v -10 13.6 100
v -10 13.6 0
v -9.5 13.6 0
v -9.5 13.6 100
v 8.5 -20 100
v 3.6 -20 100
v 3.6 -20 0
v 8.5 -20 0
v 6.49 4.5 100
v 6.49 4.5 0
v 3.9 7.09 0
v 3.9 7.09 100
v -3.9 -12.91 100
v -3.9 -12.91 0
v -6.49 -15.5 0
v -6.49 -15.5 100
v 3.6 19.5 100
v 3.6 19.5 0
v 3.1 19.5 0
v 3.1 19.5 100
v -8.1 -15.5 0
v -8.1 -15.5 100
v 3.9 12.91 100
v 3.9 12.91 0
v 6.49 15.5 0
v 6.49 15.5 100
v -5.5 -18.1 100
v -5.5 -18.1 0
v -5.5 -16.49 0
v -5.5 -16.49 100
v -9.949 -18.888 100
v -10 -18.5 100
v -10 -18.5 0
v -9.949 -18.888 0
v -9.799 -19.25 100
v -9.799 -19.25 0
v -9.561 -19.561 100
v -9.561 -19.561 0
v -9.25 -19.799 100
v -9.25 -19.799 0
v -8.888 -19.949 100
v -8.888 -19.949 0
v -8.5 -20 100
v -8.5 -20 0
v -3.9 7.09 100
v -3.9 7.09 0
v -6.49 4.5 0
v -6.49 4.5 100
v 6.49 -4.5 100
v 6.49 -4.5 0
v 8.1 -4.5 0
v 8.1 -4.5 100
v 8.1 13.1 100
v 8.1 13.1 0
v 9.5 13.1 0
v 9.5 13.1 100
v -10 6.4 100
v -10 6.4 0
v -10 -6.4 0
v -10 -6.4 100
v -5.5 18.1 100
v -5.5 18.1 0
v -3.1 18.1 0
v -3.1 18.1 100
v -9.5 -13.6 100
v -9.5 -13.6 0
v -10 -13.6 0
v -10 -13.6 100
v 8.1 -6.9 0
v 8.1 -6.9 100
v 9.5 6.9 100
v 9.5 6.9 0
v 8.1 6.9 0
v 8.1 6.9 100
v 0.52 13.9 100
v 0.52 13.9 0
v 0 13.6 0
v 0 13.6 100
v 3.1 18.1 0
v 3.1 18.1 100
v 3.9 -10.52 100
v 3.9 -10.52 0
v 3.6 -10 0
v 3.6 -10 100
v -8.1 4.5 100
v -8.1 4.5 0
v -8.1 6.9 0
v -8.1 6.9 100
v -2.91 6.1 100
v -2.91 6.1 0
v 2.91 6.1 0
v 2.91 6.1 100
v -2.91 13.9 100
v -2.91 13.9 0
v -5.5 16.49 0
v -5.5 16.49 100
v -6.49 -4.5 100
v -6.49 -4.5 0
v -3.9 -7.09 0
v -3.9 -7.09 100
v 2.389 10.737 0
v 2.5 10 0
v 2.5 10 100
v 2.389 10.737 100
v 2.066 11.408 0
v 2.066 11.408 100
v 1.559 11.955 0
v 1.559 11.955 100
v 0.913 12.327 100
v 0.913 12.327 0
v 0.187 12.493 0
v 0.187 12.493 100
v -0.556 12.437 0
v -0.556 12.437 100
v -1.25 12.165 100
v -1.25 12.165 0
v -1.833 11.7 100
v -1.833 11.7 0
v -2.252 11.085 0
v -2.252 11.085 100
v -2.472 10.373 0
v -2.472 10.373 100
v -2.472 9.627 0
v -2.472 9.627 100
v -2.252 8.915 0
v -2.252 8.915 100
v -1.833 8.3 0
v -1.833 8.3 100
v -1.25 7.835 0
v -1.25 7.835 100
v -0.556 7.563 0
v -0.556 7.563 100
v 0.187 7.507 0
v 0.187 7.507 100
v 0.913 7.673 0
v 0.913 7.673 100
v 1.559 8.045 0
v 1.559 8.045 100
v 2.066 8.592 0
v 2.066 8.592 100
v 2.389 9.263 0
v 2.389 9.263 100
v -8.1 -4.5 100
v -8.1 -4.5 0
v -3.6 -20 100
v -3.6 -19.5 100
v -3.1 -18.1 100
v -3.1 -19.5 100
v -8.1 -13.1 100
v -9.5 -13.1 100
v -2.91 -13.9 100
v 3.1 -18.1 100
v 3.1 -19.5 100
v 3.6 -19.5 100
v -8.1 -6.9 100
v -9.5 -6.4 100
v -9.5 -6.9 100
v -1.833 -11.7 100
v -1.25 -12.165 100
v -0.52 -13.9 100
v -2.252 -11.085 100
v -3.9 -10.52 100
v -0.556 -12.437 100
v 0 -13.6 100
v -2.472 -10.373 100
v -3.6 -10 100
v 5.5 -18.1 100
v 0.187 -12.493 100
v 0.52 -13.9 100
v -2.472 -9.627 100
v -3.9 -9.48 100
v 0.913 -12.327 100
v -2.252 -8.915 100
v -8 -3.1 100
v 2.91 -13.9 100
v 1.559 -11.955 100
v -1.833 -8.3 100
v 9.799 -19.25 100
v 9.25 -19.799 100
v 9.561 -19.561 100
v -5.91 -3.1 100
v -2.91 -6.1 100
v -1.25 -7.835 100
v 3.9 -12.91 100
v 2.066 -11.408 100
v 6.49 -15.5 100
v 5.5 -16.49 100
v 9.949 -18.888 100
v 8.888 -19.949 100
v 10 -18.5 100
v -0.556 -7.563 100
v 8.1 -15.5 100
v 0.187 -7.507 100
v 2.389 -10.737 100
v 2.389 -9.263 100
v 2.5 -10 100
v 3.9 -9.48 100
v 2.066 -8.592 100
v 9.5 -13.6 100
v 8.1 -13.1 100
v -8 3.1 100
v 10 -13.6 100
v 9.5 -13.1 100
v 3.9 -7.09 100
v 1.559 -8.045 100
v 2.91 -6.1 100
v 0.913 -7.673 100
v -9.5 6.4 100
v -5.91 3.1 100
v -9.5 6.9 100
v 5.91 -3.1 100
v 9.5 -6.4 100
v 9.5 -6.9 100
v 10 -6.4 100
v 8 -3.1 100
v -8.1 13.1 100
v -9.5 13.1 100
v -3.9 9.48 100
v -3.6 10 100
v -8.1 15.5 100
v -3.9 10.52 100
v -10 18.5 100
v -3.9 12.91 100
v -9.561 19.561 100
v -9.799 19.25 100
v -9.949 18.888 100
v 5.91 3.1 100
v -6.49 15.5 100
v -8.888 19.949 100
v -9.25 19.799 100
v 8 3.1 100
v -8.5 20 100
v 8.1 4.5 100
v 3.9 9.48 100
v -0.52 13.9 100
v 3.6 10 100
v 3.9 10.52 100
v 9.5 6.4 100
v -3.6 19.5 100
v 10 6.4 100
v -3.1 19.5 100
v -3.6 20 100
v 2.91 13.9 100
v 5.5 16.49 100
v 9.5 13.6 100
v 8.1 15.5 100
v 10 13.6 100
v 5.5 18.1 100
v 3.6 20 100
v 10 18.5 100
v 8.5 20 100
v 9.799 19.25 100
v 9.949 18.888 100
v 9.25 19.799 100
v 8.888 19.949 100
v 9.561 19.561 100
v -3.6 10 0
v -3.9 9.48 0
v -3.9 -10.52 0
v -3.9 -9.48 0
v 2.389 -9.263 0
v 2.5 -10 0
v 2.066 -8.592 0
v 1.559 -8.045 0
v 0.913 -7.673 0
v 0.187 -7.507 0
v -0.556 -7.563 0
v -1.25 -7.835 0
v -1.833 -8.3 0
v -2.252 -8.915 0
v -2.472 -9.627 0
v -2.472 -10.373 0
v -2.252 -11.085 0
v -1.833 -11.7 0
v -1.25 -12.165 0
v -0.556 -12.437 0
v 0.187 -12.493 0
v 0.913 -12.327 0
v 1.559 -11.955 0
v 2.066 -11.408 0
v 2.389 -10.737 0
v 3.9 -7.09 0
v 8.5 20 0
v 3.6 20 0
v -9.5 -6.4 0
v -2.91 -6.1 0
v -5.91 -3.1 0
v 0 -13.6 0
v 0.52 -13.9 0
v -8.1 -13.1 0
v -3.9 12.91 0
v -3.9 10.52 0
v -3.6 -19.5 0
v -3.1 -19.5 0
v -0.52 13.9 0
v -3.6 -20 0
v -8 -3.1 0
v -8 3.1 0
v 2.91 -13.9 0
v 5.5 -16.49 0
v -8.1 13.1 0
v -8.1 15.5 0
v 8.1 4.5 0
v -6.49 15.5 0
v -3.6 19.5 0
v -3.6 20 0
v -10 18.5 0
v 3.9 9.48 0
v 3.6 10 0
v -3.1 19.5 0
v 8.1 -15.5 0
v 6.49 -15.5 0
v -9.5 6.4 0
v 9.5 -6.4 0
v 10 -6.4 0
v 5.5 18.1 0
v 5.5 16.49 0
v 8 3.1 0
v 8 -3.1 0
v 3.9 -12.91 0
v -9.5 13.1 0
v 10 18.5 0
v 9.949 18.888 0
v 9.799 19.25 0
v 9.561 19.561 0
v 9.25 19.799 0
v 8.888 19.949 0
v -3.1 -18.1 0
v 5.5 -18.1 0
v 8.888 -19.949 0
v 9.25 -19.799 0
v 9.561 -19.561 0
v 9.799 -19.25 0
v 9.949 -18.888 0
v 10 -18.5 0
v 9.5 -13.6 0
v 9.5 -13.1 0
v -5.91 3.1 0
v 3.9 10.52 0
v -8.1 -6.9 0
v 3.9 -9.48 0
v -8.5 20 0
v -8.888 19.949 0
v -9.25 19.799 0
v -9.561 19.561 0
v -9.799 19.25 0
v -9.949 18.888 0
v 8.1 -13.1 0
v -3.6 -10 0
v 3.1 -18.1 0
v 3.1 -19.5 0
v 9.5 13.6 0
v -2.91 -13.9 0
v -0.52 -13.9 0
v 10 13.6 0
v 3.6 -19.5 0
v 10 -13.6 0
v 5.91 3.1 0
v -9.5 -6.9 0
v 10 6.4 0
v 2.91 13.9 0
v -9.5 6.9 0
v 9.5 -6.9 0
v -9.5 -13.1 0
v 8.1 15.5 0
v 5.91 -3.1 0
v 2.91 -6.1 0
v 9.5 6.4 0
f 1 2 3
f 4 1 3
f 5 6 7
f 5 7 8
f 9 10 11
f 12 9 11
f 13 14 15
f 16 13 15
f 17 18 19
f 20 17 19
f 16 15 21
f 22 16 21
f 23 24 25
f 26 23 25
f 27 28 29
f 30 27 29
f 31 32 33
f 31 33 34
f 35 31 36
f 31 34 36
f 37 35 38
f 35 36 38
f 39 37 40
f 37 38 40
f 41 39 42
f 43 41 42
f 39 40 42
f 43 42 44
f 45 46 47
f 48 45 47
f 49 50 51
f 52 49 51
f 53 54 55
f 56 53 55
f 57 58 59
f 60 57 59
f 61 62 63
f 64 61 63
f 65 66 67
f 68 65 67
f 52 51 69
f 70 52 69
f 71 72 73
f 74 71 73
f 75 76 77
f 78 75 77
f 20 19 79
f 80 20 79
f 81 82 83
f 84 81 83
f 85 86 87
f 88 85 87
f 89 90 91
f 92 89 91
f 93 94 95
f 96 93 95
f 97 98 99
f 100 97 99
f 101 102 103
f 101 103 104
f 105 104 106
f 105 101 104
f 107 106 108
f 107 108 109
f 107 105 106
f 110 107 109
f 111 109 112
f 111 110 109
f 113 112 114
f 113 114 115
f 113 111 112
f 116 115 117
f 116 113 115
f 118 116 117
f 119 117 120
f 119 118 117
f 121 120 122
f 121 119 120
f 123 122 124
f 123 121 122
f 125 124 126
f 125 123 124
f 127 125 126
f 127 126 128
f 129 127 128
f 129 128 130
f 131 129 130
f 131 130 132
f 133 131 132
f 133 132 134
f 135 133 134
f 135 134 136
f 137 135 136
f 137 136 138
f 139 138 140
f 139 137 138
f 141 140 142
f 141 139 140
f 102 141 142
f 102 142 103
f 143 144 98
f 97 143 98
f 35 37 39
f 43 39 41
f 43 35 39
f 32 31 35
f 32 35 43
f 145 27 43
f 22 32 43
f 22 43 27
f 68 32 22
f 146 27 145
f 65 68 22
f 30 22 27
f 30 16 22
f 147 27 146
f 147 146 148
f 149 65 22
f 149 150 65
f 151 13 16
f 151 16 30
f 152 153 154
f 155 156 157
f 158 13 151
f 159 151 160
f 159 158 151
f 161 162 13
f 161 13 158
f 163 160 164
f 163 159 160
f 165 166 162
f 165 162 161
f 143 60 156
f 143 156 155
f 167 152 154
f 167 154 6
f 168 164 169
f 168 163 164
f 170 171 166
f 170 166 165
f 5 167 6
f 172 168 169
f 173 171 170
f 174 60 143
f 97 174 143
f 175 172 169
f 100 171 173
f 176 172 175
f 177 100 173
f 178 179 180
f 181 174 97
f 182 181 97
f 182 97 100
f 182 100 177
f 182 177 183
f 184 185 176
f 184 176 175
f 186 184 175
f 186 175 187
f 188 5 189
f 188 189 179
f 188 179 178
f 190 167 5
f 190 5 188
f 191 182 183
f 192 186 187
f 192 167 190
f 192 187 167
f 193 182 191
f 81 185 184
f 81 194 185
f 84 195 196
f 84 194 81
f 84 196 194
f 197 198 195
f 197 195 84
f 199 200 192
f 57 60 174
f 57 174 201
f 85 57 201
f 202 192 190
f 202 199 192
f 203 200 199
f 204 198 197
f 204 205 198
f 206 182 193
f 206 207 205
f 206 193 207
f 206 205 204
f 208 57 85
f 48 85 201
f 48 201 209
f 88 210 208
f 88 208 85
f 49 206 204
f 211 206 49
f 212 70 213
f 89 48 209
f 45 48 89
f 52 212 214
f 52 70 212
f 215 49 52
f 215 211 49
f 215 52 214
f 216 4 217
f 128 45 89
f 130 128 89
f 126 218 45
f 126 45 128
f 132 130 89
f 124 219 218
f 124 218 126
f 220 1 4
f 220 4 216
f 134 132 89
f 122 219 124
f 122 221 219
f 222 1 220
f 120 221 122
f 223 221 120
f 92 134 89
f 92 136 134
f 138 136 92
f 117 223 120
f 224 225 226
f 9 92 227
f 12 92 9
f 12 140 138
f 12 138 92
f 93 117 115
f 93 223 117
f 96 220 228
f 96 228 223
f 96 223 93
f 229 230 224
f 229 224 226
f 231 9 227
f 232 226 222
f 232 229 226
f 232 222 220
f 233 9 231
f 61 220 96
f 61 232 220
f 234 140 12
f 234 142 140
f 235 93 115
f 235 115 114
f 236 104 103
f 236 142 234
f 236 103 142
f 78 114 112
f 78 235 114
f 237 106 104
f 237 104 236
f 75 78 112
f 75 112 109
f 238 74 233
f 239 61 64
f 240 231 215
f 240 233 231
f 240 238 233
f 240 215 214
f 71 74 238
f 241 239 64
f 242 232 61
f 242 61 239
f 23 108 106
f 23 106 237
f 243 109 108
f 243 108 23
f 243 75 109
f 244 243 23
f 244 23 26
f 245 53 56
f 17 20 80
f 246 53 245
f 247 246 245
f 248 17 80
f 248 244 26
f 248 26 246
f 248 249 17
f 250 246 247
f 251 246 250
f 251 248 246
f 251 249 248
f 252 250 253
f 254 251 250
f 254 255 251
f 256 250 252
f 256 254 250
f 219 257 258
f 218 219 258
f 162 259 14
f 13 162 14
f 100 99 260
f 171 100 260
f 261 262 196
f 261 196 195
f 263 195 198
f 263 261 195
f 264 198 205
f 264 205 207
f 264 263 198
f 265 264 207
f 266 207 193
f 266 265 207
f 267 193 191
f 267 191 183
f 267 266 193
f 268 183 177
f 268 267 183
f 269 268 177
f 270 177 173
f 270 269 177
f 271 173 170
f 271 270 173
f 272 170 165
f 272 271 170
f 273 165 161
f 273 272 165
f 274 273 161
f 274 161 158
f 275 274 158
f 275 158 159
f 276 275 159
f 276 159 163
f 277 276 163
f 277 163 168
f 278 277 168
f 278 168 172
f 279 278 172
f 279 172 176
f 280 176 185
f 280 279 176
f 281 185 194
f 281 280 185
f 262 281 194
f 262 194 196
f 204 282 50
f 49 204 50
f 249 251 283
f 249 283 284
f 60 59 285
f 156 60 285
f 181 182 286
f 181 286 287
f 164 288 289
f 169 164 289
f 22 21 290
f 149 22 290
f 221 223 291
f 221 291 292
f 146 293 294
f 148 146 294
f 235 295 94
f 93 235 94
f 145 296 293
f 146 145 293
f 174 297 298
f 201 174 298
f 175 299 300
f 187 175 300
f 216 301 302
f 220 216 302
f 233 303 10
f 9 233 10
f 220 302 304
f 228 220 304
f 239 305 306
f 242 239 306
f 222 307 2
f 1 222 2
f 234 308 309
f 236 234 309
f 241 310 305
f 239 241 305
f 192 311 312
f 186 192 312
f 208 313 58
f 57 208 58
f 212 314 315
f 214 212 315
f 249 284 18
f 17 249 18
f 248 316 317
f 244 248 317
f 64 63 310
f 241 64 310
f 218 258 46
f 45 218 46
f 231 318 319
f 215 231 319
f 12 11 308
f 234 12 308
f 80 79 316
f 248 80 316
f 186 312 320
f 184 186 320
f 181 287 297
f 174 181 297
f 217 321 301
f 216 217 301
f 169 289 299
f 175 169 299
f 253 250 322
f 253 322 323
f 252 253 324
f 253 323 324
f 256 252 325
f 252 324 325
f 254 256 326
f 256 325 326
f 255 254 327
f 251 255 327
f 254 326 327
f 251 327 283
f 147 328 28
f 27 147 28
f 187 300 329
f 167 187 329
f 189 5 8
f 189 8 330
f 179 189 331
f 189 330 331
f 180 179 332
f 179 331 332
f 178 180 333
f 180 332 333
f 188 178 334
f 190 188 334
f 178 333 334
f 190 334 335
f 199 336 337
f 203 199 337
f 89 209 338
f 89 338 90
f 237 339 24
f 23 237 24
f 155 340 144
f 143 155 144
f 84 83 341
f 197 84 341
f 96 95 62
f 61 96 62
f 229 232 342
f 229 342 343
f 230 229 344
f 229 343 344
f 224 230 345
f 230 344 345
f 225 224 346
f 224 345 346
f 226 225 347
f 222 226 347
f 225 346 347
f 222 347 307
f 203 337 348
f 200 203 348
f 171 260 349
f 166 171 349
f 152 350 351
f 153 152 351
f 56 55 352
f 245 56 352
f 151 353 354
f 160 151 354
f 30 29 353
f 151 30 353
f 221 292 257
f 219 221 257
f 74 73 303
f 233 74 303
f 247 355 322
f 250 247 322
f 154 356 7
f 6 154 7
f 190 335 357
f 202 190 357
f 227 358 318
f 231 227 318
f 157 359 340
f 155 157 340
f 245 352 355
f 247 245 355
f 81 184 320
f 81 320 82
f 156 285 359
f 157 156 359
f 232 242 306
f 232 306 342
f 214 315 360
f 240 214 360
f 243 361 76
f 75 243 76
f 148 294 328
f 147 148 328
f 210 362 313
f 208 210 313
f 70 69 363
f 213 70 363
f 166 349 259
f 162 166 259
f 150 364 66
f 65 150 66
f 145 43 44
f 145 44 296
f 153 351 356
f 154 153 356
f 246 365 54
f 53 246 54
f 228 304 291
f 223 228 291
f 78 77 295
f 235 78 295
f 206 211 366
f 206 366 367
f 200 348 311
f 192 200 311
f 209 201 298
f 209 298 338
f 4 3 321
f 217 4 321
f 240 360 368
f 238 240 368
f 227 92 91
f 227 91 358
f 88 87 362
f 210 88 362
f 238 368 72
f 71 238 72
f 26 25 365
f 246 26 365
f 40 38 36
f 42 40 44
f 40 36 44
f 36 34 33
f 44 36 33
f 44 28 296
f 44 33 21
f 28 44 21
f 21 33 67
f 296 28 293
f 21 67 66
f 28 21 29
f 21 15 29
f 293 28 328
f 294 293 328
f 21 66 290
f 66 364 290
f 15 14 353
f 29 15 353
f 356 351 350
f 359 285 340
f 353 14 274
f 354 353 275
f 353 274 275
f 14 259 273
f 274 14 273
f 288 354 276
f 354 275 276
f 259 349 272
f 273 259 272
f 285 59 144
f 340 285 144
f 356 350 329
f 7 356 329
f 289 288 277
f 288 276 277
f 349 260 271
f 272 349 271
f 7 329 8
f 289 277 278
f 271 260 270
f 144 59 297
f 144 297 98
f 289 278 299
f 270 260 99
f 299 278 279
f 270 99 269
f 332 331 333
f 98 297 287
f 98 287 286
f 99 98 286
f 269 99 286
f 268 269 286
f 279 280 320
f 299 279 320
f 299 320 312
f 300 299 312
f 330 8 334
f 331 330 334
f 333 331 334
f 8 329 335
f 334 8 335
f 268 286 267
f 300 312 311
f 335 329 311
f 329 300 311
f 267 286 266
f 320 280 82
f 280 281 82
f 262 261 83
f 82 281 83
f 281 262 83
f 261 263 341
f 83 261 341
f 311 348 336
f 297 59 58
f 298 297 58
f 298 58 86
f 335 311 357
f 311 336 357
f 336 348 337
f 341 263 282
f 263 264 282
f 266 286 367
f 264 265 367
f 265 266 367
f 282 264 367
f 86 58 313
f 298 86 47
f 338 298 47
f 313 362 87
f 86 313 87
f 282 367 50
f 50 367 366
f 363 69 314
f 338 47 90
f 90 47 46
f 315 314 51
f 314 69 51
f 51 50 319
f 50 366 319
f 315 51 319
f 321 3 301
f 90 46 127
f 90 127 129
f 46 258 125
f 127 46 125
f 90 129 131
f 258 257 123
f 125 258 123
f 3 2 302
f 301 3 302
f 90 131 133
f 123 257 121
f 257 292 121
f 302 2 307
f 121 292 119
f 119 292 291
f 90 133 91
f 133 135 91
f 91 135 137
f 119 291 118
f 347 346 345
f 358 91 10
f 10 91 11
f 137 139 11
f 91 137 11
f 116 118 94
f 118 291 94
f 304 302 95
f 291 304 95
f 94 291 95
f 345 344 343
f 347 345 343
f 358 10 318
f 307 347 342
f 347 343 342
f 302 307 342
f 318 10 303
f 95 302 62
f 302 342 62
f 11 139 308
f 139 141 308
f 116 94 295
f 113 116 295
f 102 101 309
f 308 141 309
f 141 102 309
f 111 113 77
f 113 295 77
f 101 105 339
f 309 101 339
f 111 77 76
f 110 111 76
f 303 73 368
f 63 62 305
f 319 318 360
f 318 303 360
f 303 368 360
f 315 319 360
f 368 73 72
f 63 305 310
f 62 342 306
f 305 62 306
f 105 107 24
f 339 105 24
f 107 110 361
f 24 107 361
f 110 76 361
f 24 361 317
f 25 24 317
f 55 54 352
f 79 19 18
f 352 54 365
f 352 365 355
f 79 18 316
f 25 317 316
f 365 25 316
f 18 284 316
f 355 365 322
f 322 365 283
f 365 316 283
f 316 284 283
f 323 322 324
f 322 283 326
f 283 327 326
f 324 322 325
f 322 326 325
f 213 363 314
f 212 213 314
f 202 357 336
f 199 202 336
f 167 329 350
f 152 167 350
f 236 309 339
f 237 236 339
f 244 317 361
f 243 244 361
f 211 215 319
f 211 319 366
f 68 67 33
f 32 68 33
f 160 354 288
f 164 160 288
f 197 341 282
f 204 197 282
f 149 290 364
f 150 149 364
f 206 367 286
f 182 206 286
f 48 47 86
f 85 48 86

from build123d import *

# Parameters (mm, degrees)
MODEL_R         = 2.5
EXTRUDE_1_DEPTH = 100


with BuildPart() as part:
    # Model → 凸台-拉伸1 (new body)
    with BuildSketch(Plane.XY):
        with BuildLine():
            Line((-3.6, 10), (-3.9, 9.480384758))
            Line((-3.9, 9.480384758), (-3.9, 7.089949494))
            Line((-3.9, 7.089949494), (-6.489949494, 4.5))
            Line((-6.489949494, 4.5), (-8.1, 4.5))
            Line((-8.1, 4.5), (-8.1, 6.9))
            Line((-8.1, 6.9), (-9.5, 6.9))
            Line((-9.5, 6.9), (-9.5, 6.4))
            Line((-9.5, 6.4), (-10, 6.4))
            Line((-10, 6.4), (-10, -6.4))
            Line((-10, -6.4), (-9.5, -6.4))
            Line((-9.5, -6.4), (-9.5, -6.9))
            Line((-9.5, -6.9), (-8.1, -6.9))
            Line((-8.1, -6.9), (-8.1, -4.5))
            Line((-8.1, -4.5), (-6.489949494, -4.5))
            Line((-6.489949494, -4.5), (-3.9, -7.089949494))
            Line((-3.9, -7.089949494), (-3.9, -9.480384758))
            Line((-3.9, -9.480384758), (-3.6, -10))
            Line((-3.6, -10), (-3.9, -10.519615242))
            Line((-3.9, -10.519615242), (-3.9, -12.910050506))
            Line((-3.9, -12.910050506), (-6.489949494, -15.5))
            Line((-6.489949494, -15.5), (-8.1, -15.5))
            Line((-8.1, -15.5), (-8.1, -13.1))
            Line((-8.1, -13.1), (-9.5, -13.1))
            Line((-9.5, -13.1), (-9.5, -13.6))
            Line((-9.5, -13.6), (-10, -13.6))
            Line((-10, -13.6), (-10, -18.5))
            ThreePointArc((-10, -18.5), (-9.560660172, -19.560660172), (-8.5, -20))
            Line((-8.5, -20), (-3.6, -20))
            Line((-3.6, -20), (-3.6, -19.5))
            Line((-3.6, -19.5), (-3.1, -19.5))
            Line((-3.1, -19.5), (-3.1, -18.1))
            Line((-3.1, -18.1), (-5.5, -18.1))
            Line((-5.5, -18.1), (-5.5, -16.489949494))
            Line((-5.5, -16.489949494), (-2.910050506, -13.9))
            Line((-2.910050506, -13.9), (-0.519615242, -13.9))
            Line((-0.519615242, -13.9), (0, -13.6))
            Line((0, -13.6), (0.519615242, -13.9))
            Line((0.519615242, -13.9), (2.910050506, -13.9))
            Line((2.910050506, -13.9), (5.5, -16.489949494))
            Line((5.5, -16.489949494), (5.5, -18.1))
            Line((5.5, -18.1), (3.1, -18.1))
            Line((3.1, -18.1), (3.1, -19.5))
            Line((3.1, -19.5), (3.6, -19.5))
            Line((3.6, -19.5), (3.6, -20))
            Line((3.6, -20), (8.5, -20))
            ThreePointArc((8.5, -20), (9.560660172, -19.560660172), (10, -18.5))
            Line((10, -18.5), (10, -13.6))
            Line((10, -13.6), (9.5, -13.6))
            Line((9.5, -13.6), (9.5, -13.1))
            Line((9.5, -13.1), (8.1, -13.1))
            Line((8.1, -13.1), (8.1, -15.5))
            Line((8.1, -15.5), (6.489949494, -15.5))
            Line((6.489949494, -15.5), (3.9, -12.910050506))
            Line((3.9, -12.910050506), (3.9, -10.519615242))
            Line((3.9, -10.519615242), (3.6, -10))
            Line((3.6, -10), (3.9, -9.480384758))
            Line((3.9, -9.480384758), (3.9, -7.089949494))
            Line((3.9, -7.089949494), (6.489949494, -4.5))
            Line((6.489949494, -4.5), (8.1, -4.5))
            Line((8.1, -4.5), (8.1, -6.9))
            Line((8.1, -6.9), (9.5, -6.9))
            Line((9.5, -6.9), (9.5, -6.4))
            Line((9.5, -6.4), (10, -6.4))
            Line((10, -6.4), (10, 6.4))
            Line((10, 6.4), (9.5, 6.4))
            Line((9.5, 6.4), (9.5, 6.9))
            Line((9.5, 6.9), (8.1, 6.9))
            Line((8.1, 6.9), (8.1, 4.5))
            Line((8.1, 4.5), (6.489949494, 4.5))
            Line((6.489949494, 4.5), (3.9, 7.089949494))
            Line((3.9, 7.089949494), (3.9, 9.480384758))
            Line((3.9, 9.480384758), (3.6, 10))
            Line((3.6, 10), (3.9, 10.519615242))
            Line((3.9, 10.519615242), (3.9, 12.910050506))
            Line((3.9, 12.910050506), (6.489949494, 15.5))
            Line((6.489949494, 15.5), (8.1, 15.5))
            Line((8.1, 15.5), (8.1, 13.1))
            Line((8.1, 13.1), (9.5, 13.1))
            Line((9.5, 13.1), (9.5, 13.6))
            Line((9.5, 13.6), (10, 13.6))
            Line((10, 13.6), (10, 18.5))
            ThreePointArc((10, 18.5), (9.560660172, 19.560660172), (8.5, 20))
            Line((8.5, 20), (3.6, 20))
            Line((3.6, 20), (3.6, 19.5))
            Line((3.6, 19.5), (3.1, 19.5))
            Line((3.1, 19.5), (3.1, 18.1))
            Line((3.1, 18.1), (5.5, 18.1))
            Line((5.5, 18.1), (5.5, 16.489949494))
            Line((5.5, 16.489949494), (2.910050506, 13.9))
            Line((2.910050506, 13.9), (0.519615242, 13.9))
            Line((0.519615242, 13.9), (0, 13.6))
            Line((0, 13.6), (-0.519615242, 13.9))
            Line((-0.519615242, 13.9), (-2.910050506, 13.9))
            Line((-2.910050506, 13.9), (-5.5, 16.489949494))
            Line((-5.5, 16.489949494), (-5.5, 18.1))
            Line((-5.5, 18.1), (-3.1, 18.1))
            Line((-3.1, 18.1), (-3.1, 19.5))
            Line((-3.1, 19.5), (-3.6, 19.5))
            Line((-3.6, 19.5), (-3.6, 20))
            Line((-3.6, 20), (-8.5, 20))
            ThreePointArc((-8.5, 20), (-9.560660172, 19.560660172), (-10, 18.5))
            Line((-10, 18.5), (-10, 13.6))
            Line((-10, 13.6), (-9.5, 13.6))
            Line((-9.5, 13.6), (-9.5, 13.1))
            Line((-9.5, 13.1), (-8.1, 13.1))
            Line((-8.1, 13.1), (-8.1, 15.5))
            Line((-8.1, 15.5), (-6.489949494, 15.5))
            Line((-6.489949494, 15.5), (-3.9, 12.910050506))
            Line((-3.9, 12.910050506), (-3.9, 10.519615242))
            Line((-3.9, 10.519615242), (-3.6, 10))
        make_face()
        with Locations((0, 10)):
            Circle(MODEL_R, mode=Mode.SUBTRACT)
        with Locations((0, -10)):
            Circle(MODEL_R, mode=Mode.SUBTRACT)
        Polygon((8, -3.1), (5.910050506, -3.1), (2.910050506, -6.1), (-2.910050506, -6.1), (-5.910050506, -3.1), (-8, -3.1), (-8, 3.1), (-5.910050506, 3.1), (-2.910050506, 6.1), (2.910050506, 6.1), (5.910050506, 3.1), (8, 3.1), align=None, mode=Mode.SUBTRACT)
    extrude(amount=EXTRUDE_1_DEPTH)


solid = part.part
